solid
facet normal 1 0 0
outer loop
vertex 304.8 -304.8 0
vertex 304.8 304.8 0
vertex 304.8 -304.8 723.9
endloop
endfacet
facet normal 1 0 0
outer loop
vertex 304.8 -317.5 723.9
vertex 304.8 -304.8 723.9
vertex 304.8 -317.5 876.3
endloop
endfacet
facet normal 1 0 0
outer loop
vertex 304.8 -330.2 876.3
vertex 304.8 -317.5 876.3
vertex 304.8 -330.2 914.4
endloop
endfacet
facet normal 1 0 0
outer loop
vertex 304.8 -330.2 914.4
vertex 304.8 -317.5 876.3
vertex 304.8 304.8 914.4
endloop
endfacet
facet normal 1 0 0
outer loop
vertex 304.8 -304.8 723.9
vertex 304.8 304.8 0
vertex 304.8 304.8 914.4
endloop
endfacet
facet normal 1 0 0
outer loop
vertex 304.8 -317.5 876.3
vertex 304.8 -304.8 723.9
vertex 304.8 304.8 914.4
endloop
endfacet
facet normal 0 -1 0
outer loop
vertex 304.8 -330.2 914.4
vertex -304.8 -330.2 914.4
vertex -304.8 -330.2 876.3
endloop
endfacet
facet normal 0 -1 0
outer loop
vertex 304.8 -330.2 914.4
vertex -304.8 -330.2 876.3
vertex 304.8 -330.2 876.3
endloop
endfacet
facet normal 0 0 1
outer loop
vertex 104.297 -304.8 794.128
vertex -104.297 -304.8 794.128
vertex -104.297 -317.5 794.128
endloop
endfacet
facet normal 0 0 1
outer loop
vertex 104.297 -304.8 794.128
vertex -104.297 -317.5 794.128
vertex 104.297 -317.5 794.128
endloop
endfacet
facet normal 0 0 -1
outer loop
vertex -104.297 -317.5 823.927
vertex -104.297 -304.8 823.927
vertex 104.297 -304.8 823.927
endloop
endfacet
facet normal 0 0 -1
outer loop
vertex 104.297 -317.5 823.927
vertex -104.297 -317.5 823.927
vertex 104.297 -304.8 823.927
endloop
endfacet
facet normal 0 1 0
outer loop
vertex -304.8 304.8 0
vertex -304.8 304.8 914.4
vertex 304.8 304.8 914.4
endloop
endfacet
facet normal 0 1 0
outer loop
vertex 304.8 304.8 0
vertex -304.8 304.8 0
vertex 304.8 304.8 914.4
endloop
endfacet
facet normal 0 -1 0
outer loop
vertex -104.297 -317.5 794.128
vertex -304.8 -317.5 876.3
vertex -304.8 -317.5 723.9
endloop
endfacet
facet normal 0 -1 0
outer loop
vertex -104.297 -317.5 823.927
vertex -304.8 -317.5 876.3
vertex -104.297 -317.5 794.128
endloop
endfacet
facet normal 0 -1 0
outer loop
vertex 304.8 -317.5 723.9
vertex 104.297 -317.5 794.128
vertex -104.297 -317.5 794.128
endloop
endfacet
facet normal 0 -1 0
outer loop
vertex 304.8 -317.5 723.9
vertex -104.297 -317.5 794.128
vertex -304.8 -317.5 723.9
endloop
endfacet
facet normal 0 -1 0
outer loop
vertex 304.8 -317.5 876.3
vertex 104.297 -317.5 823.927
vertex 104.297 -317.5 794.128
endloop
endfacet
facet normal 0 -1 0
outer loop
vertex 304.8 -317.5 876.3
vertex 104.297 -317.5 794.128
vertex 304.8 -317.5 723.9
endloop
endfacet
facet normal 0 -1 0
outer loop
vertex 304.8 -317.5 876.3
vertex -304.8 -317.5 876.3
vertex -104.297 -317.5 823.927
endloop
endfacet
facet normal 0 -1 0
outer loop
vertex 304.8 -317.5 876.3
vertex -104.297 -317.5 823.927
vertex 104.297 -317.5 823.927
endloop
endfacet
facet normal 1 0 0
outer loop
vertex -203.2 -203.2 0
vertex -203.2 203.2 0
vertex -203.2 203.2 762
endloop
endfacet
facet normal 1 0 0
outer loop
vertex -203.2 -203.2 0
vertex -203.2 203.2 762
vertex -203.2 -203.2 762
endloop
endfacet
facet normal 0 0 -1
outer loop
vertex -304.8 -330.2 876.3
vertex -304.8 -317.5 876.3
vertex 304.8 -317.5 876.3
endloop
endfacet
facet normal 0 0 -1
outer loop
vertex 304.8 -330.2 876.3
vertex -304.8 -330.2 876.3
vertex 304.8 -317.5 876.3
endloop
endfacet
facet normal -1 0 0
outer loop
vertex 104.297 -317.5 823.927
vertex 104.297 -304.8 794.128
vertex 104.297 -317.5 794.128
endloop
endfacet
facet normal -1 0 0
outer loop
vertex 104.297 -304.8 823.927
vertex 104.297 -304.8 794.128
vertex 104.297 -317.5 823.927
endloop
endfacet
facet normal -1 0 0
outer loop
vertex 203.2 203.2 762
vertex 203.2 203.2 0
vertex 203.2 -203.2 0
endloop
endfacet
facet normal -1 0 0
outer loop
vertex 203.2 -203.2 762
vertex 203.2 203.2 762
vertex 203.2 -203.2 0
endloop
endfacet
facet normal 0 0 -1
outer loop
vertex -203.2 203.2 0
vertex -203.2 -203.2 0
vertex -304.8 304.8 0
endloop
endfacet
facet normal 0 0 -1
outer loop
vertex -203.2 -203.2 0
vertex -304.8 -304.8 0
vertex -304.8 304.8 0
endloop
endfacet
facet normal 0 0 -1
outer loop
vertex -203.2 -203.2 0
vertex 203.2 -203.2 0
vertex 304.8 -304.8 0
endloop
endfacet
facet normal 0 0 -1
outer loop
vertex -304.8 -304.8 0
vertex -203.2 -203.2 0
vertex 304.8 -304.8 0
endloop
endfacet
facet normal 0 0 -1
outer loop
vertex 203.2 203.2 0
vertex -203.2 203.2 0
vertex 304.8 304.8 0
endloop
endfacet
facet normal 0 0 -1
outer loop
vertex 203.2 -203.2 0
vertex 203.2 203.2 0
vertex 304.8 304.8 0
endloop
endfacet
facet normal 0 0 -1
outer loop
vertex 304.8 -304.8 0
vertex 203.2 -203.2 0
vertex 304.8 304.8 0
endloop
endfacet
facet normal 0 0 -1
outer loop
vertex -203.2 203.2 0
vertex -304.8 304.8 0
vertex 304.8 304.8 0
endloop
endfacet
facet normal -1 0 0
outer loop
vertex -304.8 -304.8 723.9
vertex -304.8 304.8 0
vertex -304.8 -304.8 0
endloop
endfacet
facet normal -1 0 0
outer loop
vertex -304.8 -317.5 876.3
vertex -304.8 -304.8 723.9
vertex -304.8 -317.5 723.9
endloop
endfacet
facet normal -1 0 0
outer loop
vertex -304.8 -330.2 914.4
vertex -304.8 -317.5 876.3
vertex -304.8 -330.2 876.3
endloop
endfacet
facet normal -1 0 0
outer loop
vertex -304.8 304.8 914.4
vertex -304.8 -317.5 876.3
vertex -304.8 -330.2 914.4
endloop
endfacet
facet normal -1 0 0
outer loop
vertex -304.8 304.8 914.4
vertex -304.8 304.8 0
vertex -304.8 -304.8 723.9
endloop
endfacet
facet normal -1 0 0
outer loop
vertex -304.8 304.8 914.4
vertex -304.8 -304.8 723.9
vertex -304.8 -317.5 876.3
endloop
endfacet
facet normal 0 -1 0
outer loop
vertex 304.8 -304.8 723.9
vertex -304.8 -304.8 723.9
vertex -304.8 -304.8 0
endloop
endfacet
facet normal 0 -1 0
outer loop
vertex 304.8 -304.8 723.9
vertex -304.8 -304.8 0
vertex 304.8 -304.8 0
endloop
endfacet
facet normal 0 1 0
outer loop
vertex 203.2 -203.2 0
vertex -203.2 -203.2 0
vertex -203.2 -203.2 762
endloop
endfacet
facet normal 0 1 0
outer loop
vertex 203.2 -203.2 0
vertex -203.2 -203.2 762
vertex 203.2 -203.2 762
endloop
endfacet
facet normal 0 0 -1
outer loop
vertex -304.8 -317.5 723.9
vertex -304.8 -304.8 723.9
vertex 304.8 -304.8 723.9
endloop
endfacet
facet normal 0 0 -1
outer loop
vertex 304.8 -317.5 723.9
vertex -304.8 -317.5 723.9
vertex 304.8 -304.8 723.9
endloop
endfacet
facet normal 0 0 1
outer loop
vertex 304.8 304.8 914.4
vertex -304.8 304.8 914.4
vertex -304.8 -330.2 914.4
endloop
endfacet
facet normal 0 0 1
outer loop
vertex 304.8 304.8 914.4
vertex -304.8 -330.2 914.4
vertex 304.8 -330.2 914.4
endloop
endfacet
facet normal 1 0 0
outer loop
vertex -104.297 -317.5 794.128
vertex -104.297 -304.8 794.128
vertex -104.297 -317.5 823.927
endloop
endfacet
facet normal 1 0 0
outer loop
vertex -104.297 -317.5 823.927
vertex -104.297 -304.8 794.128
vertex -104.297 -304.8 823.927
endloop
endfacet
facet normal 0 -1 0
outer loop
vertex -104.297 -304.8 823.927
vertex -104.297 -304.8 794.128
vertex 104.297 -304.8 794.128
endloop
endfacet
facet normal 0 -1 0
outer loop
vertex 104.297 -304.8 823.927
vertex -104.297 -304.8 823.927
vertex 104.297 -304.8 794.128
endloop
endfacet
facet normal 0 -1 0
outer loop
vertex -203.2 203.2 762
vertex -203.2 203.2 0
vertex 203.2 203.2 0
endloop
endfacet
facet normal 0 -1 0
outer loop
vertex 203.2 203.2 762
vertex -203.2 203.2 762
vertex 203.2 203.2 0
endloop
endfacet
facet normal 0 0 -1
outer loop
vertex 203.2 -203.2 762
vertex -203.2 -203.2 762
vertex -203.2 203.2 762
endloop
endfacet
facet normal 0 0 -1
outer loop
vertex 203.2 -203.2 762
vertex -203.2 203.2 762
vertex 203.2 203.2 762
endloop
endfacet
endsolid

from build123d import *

# Parameters (mm, degrees)
F0_W     = 609.6
F0_H     = 609.6
F1_DEPTH = 914.4
F2_W     = 609.6
F2_H     = 609.6
F2_H_2   = 25.4
F3_DEPTH = 38.1
F4_W     = 609.6
F4_H     = 152.4
F4_W_2   = 208.593592
F4_H_2   = 29.799104
F5_DEPTH = 12.7
F6_W     = 406.4
F6_H     = 406.4
F7_DEPTH = 762


with BuildPart() as f1:
    # F0 (on Top) → F1 (new body)
    with BuildSketch(Plane.XY):
        Rectangle(F0_W, F0_H)
    extrude(amount=F1_DEPTH)

    # F2 (on face) → F3 (join)
    with BuildSketch(Plane.XY.offset(914.4)):
        Rectangle(F2_W, F2_H)
        with Locations((0, -317.5)):
            Rectangle(F2_W, F2_H_2)
    extrude(amount=-F3_DEPTH)

    # F4 (on face) → F5 (join)
    with BuildSketch(Plane.XZ.offset(304.8)):
        with Locations((0, 800.1)):
            Rectangle(F4_W, F4_H)
        with Locations((0, 809.027108)):
            Rectangle(F4_W_2, F4_H_2, mode=Mode.SUBTRACT)
    extrude(amount=F5_DEPTH)

    # F6 (on face) → F7 (cut)
    with BuildSketch(Plane(origin=(0, 0, 0), x_dir=(1, 0, 0), z_dir=(0, 0, -1))):
        Rectangle(F6_W, F6_H)
    extrude(amount=-F7_DEPTH, mode=Mode.SUBTRACT)


solid = f1.part
